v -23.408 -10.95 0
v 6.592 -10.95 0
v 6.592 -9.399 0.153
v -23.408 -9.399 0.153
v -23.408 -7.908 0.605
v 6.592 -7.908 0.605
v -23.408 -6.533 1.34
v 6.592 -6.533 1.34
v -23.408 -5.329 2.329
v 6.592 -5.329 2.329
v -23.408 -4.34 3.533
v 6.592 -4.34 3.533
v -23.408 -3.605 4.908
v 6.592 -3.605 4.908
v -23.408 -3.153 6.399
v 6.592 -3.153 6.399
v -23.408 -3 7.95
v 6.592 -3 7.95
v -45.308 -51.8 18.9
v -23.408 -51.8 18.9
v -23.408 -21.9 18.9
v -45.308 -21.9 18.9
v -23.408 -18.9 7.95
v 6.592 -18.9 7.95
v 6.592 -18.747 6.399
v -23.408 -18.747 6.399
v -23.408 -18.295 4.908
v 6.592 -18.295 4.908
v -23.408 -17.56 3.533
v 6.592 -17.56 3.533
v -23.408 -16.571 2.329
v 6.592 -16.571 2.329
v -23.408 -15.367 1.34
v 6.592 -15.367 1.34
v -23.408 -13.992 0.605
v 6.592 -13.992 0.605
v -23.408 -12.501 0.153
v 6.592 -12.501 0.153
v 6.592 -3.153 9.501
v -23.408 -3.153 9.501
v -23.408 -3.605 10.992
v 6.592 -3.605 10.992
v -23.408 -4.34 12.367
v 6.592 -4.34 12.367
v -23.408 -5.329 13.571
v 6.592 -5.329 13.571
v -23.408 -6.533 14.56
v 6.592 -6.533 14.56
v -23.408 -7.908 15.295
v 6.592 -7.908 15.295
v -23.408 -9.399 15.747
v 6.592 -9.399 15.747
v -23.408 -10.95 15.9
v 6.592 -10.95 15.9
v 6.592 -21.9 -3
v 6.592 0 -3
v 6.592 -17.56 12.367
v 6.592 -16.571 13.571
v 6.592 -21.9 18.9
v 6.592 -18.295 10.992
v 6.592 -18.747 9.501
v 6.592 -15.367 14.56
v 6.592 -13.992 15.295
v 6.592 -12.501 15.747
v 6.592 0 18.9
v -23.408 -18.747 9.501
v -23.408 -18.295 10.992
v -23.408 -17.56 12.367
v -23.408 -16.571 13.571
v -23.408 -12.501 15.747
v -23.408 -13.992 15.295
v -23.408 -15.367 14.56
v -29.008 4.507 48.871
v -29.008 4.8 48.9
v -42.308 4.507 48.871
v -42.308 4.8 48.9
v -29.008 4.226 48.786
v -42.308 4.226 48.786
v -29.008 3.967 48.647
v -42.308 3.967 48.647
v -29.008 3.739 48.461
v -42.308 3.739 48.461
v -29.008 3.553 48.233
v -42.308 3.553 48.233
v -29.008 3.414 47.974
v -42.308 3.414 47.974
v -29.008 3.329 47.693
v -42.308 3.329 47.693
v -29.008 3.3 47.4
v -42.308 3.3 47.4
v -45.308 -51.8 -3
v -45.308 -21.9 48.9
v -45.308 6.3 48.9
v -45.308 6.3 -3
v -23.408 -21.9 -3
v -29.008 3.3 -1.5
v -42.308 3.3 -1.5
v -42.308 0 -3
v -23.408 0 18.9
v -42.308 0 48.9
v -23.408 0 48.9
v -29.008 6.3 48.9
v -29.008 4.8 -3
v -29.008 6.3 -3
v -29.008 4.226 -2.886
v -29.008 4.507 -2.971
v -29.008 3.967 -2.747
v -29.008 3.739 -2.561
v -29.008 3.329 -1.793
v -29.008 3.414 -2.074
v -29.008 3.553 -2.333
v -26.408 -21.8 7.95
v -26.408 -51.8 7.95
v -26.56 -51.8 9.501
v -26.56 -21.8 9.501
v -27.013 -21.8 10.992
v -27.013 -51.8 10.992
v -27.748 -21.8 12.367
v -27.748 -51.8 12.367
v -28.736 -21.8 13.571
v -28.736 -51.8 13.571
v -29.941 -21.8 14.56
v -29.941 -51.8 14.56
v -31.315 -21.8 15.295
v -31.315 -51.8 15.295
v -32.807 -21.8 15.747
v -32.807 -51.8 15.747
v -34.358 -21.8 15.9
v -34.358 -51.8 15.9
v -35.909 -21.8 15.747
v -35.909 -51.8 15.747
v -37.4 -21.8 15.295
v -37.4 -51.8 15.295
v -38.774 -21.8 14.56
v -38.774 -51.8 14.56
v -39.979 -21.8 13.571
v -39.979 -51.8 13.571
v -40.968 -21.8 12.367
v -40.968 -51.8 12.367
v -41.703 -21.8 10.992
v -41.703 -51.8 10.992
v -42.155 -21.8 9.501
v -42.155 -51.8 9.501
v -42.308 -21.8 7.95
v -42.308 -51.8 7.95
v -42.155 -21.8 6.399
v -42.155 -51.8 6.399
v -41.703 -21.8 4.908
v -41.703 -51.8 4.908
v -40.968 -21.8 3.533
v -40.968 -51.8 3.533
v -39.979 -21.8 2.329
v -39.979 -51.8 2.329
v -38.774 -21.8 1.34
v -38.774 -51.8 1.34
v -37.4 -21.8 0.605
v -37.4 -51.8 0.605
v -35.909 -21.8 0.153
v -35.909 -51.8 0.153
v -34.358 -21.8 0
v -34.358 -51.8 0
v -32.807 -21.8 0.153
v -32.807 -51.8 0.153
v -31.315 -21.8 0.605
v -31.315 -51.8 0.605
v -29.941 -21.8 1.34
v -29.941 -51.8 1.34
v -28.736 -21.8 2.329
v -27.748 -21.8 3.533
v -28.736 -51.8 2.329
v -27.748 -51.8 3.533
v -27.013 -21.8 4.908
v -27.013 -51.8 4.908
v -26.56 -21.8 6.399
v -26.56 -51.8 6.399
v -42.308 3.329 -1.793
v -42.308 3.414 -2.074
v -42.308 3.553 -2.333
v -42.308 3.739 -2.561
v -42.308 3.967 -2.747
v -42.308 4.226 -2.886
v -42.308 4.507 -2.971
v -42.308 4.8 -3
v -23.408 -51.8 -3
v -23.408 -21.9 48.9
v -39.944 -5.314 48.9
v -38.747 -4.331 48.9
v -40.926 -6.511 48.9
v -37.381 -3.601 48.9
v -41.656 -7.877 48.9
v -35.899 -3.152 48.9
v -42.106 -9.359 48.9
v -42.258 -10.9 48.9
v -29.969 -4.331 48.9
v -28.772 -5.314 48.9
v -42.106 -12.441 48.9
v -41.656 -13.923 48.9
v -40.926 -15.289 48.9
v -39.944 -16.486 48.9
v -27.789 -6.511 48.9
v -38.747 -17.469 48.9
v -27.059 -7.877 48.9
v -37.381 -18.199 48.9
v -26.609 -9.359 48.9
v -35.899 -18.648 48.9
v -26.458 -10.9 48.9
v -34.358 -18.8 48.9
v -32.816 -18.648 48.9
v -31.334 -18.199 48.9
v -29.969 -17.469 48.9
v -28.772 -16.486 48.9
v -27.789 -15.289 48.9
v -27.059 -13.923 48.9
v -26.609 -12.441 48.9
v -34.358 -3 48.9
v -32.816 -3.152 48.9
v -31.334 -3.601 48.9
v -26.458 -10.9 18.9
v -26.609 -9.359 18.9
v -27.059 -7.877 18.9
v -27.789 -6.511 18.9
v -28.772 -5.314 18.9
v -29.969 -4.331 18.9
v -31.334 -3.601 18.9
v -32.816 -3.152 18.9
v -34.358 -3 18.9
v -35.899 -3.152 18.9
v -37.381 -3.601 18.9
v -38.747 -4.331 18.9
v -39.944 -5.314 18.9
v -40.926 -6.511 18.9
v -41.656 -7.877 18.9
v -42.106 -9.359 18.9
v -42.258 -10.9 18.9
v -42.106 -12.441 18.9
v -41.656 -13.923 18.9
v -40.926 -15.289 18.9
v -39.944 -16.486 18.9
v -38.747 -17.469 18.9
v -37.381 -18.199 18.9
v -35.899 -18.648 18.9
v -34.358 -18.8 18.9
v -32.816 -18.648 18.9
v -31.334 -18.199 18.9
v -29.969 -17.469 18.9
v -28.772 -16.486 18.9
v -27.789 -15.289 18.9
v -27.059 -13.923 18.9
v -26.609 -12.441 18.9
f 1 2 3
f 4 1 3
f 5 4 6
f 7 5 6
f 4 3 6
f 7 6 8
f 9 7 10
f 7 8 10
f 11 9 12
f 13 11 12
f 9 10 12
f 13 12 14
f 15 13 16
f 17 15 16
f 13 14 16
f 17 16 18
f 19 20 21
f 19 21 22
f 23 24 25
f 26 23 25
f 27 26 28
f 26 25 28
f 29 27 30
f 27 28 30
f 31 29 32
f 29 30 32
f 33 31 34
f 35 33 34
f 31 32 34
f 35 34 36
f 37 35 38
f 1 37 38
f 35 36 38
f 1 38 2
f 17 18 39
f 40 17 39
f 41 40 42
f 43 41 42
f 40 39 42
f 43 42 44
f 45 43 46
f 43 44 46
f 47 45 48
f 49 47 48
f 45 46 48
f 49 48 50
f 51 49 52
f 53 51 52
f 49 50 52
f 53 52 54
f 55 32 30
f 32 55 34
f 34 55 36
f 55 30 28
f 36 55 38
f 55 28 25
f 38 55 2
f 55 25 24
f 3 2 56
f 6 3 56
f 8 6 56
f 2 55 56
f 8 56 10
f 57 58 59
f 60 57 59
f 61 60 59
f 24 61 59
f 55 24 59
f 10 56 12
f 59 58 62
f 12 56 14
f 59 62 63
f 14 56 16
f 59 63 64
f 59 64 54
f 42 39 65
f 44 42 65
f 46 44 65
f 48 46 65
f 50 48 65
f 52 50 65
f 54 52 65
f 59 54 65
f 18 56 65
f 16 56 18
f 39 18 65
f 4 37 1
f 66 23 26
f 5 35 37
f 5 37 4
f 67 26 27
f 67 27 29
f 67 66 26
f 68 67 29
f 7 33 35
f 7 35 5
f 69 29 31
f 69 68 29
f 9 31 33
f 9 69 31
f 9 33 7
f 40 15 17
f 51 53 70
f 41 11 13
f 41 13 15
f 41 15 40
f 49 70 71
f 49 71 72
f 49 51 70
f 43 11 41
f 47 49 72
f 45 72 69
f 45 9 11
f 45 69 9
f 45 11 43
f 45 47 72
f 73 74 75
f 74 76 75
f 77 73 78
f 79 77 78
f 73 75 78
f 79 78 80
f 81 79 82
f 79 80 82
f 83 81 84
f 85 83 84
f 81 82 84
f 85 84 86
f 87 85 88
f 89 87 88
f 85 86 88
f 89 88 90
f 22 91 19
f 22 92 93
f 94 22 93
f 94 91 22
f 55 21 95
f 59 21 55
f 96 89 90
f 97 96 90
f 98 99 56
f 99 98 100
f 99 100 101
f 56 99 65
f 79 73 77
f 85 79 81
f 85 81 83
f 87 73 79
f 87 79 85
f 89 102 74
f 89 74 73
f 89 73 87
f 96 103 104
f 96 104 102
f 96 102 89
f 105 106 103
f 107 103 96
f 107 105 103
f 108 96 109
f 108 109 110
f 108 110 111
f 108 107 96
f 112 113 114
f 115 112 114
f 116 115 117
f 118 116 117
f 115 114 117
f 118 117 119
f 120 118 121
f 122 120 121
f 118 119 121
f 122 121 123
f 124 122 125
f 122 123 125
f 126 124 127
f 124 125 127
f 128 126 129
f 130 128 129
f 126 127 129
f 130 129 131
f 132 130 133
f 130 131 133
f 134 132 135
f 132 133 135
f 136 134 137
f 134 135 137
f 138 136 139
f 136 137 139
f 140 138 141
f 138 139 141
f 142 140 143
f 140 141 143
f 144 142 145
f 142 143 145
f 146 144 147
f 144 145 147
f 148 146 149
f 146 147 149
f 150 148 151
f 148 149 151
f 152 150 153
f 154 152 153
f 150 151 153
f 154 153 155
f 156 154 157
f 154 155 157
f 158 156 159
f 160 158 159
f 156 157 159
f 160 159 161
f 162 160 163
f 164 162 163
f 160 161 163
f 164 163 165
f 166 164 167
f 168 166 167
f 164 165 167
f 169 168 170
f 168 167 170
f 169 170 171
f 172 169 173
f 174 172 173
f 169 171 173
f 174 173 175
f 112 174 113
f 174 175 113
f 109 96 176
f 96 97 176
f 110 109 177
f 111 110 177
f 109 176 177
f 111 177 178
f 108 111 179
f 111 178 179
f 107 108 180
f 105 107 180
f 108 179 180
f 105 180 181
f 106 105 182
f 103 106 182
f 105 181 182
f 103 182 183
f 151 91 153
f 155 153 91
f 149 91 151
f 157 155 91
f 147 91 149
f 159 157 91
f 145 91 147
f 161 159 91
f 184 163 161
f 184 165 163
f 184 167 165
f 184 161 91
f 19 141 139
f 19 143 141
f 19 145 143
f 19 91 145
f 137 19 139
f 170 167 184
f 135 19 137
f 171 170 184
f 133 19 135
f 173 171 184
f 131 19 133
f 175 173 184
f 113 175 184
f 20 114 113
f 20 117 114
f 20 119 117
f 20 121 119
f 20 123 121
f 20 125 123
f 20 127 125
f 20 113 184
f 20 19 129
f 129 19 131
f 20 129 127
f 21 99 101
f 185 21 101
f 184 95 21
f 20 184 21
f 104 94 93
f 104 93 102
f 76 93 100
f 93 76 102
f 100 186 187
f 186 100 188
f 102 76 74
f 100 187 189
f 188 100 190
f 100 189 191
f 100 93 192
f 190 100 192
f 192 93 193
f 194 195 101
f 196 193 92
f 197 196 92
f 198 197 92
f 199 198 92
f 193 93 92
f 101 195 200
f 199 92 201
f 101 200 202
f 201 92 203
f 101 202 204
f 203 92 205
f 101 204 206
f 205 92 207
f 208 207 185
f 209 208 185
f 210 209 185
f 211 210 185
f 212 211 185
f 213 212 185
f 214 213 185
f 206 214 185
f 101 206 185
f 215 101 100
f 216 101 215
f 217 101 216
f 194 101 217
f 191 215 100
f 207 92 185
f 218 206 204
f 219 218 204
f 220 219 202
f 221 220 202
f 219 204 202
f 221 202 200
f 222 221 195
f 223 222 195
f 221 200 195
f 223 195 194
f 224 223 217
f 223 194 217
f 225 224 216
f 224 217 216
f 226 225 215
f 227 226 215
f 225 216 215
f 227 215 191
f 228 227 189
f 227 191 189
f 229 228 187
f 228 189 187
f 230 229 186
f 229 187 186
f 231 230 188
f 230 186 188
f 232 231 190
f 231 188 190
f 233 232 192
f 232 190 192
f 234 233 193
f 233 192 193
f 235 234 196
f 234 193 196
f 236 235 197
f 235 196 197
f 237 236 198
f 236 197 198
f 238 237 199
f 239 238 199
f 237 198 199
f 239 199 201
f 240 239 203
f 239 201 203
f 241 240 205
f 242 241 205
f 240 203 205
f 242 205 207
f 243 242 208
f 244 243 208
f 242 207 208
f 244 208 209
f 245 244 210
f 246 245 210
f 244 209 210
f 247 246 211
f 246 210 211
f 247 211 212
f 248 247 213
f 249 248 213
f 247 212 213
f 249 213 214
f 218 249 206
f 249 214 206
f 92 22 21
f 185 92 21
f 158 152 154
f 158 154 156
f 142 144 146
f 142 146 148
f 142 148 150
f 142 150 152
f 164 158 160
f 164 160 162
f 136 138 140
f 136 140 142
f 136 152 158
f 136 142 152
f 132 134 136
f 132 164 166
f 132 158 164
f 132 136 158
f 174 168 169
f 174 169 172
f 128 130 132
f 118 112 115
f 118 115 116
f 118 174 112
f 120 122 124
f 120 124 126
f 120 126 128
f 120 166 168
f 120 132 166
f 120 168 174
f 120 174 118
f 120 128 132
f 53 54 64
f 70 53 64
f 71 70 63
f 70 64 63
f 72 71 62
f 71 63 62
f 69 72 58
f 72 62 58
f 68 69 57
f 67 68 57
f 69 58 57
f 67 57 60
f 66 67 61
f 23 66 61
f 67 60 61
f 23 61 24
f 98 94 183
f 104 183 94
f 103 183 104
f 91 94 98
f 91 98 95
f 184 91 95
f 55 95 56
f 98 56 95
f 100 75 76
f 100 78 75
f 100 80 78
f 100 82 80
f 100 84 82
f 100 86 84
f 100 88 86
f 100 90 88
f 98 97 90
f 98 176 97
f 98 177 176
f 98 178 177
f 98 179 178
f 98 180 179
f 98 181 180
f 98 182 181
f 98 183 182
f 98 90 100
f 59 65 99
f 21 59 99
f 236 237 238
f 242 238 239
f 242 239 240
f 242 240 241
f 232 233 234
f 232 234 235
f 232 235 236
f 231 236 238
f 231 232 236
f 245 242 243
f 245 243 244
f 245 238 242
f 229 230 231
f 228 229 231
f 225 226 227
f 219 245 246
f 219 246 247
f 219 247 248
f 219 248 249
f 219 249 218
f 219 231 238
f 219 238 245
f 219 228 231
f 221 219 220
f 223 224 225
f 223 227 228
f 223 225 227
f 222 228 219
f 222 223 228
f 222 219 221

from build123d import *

# Parameters (mm, degrees)
F0_W      = 27
F0_H      = 15.9
F0_W_2    = 15.9
F0_H_2    = 27
F0_W_3    = 3
F0_H_3    = 3
F1_DEPTH  = 21.9
F2_DEPTH  = 51.8
F3_R      = 7.95
F6_DEPTH  = 30
F7_DEPTH  = 30
F4_R      = 7.9
F8_DEPTH  = 30
F10_DEPTH = 51.9
F11_R     = 1.5


with BuildPart() as f1:
    # F0 (on Front) → F1 (new body)
    with BuildSketch(Plane.XZ):
        with BuildLine():
            Line((-34.3576915575, 15.9), (-42.3076915575, 15.9))
            Line((-42.3076915575, 15.9), (-42.3076915575, 7.9499999931))
            ThreePointArc((-42.3076915575, 7.9499999931), (-39.9791904704, 13.571498908), (-34.3576915575, 15.9))
        make_face()
        with BuildLine():
            ThreePointArc((-34.3576915575, 15.9), (-39.9791904704, 13.571498908), (-42.3076915575, 7.9499999931))
            ThreePointArc((-42.3076915575, 7.9499999931), (-39.9791904655, 2.3285010871), (-34.3576915575, 0))
            ThreePointArc((-34.3576915575, 0), (-28.7361926471, 2.3285010896), (-26.4076915575, 7.95))
            ThreePointArc((-26.4076915575, 7.95), (-28.7361926471, 13.5714989104), (-34.3576915575, 15.9))
        make_face()
        Polygon((-42.3076915575, 18.9), (-42.3076915575, 45.9), (-26.4076915575, 45.9), (-26.4076915575, 18.9), (-23.4076915575, 18.9), (-23.4076915575, 48.9), (-45.3076915575, 48.9), (-45.3076915575, 18.9), align=None)
        with Locations((-9.9076915575, 7.95)):
            Rectangle(F0_W, F0_H)
        with Locations((-34.3576915575, 32.4)):
            Rectangle(F0_W_2, F0_H_2)
        with BuildLine():
            ThreePointArc((-34.3576915575, 0), (-39.9791904655, 2.3285010871), (-42.3076915575, 7.9499999931))
            Line((-42.3076915575, 7.9499999931), (-42.3076915575, 0))
            Line((-42.3076915575, 0), (-34.3576915575, 0))
        make_face()
        with BuildLine():
            Line((-26.4076915575, 0), (-26.4076915575, 7.95))
            ThreePointArc((-26.4076915575, 7.95), (-28.7361926471, 2.3285010896), (-34.3576915575, 0))
            Line((-34.3576915575, 0), (-26.4076915575, 0))
        make_face()
        with BuildLine():
            Line((-26.4076915575, 7.95), (-26.4076915575, 15.9))
            Line((-26.4076915575, 15.9), (-34.3576915575, 15.9))
            ThreePointArc((-34.3576915575, 15.9), (-28.7361926471, 13.5714989104), (-26.4076915575, 7.95))
        make_face()
        Polygon((6.5923084425, 18.9), (-23.4076915575, 18.9), (-23.4076915575, 15.9), (3.5923084425, 15.9), (3.5923084425, 0), (-23.4076915575, 0), (-23.4076915575, -3), (6.5923084425, -3), align=None)
        Polygon((-26.4076915575, 18.9), (-42.3076915575, 18.9), (-42.3076915575, 15.9), (-34.3576915575, 15.9), (-26.4076915575, 15.9), align=None)
        Polygon((-23.4076915575, 15.9), (-26.4076915575, 15.9), (-26.4076915575, 7.95), (-26.4076915575, 0), (-23.4076915575, 0), align=None)
        Polygon((-42.3076915575, 15.9), (-42.3076915575, 18.9), (-45.3076915575, 18.9), (-45.3076915575, -3), (-23.4076915575, -3), (-23.4076915575, 0), (-26.4076915575, 0), (-34.3576915575, 0), (-42.3076915575, 0), (-42.3076915575, 7.9499999931), align=None)
        with Locations((-24.9076915575, 17.4)):
            Rectangle(F0_W_3, F0_H_3)
    extrude(amount=F1_DEPTH)

    # F0 (on Front) → F2 (join)
    with BuildSketch(Plane.XZ):
        Polygon((-42.3076915575, 15.9), (-42.3076915575, 18.9), (-45.3076915575, 18.9), (-45.3076915575, -3), (-23.4076915575, -3), (-23.4076915575, 0), (-26.4076915575, 0), (-34.3576915575, 0), (-42.3076915575, 0), (-42.3076915575, 7.9499999931), align=None)
        with BuildLine():
            ThreePointArc((-34.3576915575, 15.9), (-39.9791904704, 13.571498908), (-42.3076915575, 7.9499999931))
            ThreePointArc((-42.3076915575, 7.9499999931), (-39.9791904655, 2.3285010871), (-34.3576915575, 0))
            ThreePointArc((-34.3576915575, 0), (-28.7361926471, 2.3285010896), (-26.4076915575, 7.95))
            ThreePointArc((-26.4076915575, 7.95), (-28.7361926471, 13.5714989104), (-34.3576915575, 15.9))
        make_face()
        Polygon((-26.4076915575, 18.9), (-42.3076915575, 18.9), (-42.3076915575, 15.9), (-34.3576915575, 15.9), (-26.4076915575, 15.9), align=None)
        Polygon((-23.4076915575, 15.9), (-26.4076915575, 15.9), (-26.4076915575, 7.95), (-26.4076915575, 0), (-23.4076915575, 0), align=None)
        with Locations((-24.9076915575, 17.4)):
            Rectangle(F0_W_3, F0_H_3)
        with BuildLine():
            Line((-26.4076915575, 7.95), (-26.4076915575, 15.9))
            Line((-26.4076915575, 15.9), (-34.3576915575, 15.9))
            ThreePointArc((-34.3576915575, 15.9), (-28.7361926471, 13.5714989104), (-26.4076915575, 7.95))
        make_face()
        with BuildLine():
            Line((-34.3576915575, 15.9), (-42.3076915575, 15.9))
            Line((-42.3076915575, 15.9), (-42.3076915575, 7.9499999931))
            ThreePointArc((-42.3076915575, 7.9499999931), (-39.9791904704, 13.571498908), (-34.3576915575, 15.9))
        make_face()
        with BuildLine():
            ThreePointArc((-34.3576915575, 0), (-39.9791904655, 2.3285010871), (-42.3076915575, 7.9499999931))
            Line((-42.3076915575, 7.9499999931), (-42.3076915575, 0))
            Line((-42.3076915575, 0), (-34.3576915575, 0))
        make_face()
        with BuildLine():
            Line((-26.4076915575, 0), (-26.4076915575, 7.95))
            ThreePointArc((-26.4076915575, 7.95), (-28.7361926471, 2.3285010896), (-34.3576915575, 0))
            Line((-34.3576915575, 0), (-26.4076915575, 0))
        make_face()
    extrude(amount=F2_DEPTH)

    # F3 (on face) → F6 (cut)
    with BuildSketch(Plane.XZ.offset(51.8)):
        with Locations((-34.3576915575, 7.95)):
            Circle(F3_R)
    extrude(amount=-F6_DEPTH, mode=Mode.SUBTRACT)

    # F5 (on face) → F7 (cut)
    with BuildSketch(Plane.YZ.offset(6.5923084425)):
        with BuildLine():
            ThreePointArc((-3, 7.95), (-5.3285010896, 13.5714989104), (-10.95, 15.9))
            ThreePointArc((-10.95, 15.9), (-16.5714989104, 13.5714989104), (-18.9, 7.95))
            ThreePointArc((-18.9, 7.95), (-16.5714989104, 2.3285010896), (-10.95, 0))
            ThreePointArc((-10.95, 0), (-5.3285010896, 2.3285010896), (-3, 7.95))
        make_face()
    extrude(amount=-F7_DEPTH, mode=Mode.SUBTRACT)

    # F4 (on face) → F8 (cut)
    with BuildSketch(Plane.XY.offset(48.9)):
        with Locations((-34.3576915575, -10.9)):
            Circle(F4_R)
    extrude(amount=-F8_DEPTH, mode=Mode.SUBTRACT)

    # F9 (on face) → F10 (join)
    with BuildSketch(Plane(origin=(0, 0, -3), x_dir=(1, 0, 0), z_dir=(0, 0, -1))):
        Polygon((-42.3076915575, 0), (-45.3076915575, 0), (-45.3076915575, -6.3), (-29.0076915575, -6.3), (-29.0076915575, -3.3), (-42.3076915575, -3.3), align=None)
    extrude(amount=-F10_DEPTH)

    # F11
    f11_edges = [f1.edges().sort_by_distance(p)[0] for p in [
        (-35.657692, 3.3, -3),
        (-35.657692, 3.3, 48.9),
    ]]
    fillet(f11_edges, radius=F11_R)


solid = f1.part
